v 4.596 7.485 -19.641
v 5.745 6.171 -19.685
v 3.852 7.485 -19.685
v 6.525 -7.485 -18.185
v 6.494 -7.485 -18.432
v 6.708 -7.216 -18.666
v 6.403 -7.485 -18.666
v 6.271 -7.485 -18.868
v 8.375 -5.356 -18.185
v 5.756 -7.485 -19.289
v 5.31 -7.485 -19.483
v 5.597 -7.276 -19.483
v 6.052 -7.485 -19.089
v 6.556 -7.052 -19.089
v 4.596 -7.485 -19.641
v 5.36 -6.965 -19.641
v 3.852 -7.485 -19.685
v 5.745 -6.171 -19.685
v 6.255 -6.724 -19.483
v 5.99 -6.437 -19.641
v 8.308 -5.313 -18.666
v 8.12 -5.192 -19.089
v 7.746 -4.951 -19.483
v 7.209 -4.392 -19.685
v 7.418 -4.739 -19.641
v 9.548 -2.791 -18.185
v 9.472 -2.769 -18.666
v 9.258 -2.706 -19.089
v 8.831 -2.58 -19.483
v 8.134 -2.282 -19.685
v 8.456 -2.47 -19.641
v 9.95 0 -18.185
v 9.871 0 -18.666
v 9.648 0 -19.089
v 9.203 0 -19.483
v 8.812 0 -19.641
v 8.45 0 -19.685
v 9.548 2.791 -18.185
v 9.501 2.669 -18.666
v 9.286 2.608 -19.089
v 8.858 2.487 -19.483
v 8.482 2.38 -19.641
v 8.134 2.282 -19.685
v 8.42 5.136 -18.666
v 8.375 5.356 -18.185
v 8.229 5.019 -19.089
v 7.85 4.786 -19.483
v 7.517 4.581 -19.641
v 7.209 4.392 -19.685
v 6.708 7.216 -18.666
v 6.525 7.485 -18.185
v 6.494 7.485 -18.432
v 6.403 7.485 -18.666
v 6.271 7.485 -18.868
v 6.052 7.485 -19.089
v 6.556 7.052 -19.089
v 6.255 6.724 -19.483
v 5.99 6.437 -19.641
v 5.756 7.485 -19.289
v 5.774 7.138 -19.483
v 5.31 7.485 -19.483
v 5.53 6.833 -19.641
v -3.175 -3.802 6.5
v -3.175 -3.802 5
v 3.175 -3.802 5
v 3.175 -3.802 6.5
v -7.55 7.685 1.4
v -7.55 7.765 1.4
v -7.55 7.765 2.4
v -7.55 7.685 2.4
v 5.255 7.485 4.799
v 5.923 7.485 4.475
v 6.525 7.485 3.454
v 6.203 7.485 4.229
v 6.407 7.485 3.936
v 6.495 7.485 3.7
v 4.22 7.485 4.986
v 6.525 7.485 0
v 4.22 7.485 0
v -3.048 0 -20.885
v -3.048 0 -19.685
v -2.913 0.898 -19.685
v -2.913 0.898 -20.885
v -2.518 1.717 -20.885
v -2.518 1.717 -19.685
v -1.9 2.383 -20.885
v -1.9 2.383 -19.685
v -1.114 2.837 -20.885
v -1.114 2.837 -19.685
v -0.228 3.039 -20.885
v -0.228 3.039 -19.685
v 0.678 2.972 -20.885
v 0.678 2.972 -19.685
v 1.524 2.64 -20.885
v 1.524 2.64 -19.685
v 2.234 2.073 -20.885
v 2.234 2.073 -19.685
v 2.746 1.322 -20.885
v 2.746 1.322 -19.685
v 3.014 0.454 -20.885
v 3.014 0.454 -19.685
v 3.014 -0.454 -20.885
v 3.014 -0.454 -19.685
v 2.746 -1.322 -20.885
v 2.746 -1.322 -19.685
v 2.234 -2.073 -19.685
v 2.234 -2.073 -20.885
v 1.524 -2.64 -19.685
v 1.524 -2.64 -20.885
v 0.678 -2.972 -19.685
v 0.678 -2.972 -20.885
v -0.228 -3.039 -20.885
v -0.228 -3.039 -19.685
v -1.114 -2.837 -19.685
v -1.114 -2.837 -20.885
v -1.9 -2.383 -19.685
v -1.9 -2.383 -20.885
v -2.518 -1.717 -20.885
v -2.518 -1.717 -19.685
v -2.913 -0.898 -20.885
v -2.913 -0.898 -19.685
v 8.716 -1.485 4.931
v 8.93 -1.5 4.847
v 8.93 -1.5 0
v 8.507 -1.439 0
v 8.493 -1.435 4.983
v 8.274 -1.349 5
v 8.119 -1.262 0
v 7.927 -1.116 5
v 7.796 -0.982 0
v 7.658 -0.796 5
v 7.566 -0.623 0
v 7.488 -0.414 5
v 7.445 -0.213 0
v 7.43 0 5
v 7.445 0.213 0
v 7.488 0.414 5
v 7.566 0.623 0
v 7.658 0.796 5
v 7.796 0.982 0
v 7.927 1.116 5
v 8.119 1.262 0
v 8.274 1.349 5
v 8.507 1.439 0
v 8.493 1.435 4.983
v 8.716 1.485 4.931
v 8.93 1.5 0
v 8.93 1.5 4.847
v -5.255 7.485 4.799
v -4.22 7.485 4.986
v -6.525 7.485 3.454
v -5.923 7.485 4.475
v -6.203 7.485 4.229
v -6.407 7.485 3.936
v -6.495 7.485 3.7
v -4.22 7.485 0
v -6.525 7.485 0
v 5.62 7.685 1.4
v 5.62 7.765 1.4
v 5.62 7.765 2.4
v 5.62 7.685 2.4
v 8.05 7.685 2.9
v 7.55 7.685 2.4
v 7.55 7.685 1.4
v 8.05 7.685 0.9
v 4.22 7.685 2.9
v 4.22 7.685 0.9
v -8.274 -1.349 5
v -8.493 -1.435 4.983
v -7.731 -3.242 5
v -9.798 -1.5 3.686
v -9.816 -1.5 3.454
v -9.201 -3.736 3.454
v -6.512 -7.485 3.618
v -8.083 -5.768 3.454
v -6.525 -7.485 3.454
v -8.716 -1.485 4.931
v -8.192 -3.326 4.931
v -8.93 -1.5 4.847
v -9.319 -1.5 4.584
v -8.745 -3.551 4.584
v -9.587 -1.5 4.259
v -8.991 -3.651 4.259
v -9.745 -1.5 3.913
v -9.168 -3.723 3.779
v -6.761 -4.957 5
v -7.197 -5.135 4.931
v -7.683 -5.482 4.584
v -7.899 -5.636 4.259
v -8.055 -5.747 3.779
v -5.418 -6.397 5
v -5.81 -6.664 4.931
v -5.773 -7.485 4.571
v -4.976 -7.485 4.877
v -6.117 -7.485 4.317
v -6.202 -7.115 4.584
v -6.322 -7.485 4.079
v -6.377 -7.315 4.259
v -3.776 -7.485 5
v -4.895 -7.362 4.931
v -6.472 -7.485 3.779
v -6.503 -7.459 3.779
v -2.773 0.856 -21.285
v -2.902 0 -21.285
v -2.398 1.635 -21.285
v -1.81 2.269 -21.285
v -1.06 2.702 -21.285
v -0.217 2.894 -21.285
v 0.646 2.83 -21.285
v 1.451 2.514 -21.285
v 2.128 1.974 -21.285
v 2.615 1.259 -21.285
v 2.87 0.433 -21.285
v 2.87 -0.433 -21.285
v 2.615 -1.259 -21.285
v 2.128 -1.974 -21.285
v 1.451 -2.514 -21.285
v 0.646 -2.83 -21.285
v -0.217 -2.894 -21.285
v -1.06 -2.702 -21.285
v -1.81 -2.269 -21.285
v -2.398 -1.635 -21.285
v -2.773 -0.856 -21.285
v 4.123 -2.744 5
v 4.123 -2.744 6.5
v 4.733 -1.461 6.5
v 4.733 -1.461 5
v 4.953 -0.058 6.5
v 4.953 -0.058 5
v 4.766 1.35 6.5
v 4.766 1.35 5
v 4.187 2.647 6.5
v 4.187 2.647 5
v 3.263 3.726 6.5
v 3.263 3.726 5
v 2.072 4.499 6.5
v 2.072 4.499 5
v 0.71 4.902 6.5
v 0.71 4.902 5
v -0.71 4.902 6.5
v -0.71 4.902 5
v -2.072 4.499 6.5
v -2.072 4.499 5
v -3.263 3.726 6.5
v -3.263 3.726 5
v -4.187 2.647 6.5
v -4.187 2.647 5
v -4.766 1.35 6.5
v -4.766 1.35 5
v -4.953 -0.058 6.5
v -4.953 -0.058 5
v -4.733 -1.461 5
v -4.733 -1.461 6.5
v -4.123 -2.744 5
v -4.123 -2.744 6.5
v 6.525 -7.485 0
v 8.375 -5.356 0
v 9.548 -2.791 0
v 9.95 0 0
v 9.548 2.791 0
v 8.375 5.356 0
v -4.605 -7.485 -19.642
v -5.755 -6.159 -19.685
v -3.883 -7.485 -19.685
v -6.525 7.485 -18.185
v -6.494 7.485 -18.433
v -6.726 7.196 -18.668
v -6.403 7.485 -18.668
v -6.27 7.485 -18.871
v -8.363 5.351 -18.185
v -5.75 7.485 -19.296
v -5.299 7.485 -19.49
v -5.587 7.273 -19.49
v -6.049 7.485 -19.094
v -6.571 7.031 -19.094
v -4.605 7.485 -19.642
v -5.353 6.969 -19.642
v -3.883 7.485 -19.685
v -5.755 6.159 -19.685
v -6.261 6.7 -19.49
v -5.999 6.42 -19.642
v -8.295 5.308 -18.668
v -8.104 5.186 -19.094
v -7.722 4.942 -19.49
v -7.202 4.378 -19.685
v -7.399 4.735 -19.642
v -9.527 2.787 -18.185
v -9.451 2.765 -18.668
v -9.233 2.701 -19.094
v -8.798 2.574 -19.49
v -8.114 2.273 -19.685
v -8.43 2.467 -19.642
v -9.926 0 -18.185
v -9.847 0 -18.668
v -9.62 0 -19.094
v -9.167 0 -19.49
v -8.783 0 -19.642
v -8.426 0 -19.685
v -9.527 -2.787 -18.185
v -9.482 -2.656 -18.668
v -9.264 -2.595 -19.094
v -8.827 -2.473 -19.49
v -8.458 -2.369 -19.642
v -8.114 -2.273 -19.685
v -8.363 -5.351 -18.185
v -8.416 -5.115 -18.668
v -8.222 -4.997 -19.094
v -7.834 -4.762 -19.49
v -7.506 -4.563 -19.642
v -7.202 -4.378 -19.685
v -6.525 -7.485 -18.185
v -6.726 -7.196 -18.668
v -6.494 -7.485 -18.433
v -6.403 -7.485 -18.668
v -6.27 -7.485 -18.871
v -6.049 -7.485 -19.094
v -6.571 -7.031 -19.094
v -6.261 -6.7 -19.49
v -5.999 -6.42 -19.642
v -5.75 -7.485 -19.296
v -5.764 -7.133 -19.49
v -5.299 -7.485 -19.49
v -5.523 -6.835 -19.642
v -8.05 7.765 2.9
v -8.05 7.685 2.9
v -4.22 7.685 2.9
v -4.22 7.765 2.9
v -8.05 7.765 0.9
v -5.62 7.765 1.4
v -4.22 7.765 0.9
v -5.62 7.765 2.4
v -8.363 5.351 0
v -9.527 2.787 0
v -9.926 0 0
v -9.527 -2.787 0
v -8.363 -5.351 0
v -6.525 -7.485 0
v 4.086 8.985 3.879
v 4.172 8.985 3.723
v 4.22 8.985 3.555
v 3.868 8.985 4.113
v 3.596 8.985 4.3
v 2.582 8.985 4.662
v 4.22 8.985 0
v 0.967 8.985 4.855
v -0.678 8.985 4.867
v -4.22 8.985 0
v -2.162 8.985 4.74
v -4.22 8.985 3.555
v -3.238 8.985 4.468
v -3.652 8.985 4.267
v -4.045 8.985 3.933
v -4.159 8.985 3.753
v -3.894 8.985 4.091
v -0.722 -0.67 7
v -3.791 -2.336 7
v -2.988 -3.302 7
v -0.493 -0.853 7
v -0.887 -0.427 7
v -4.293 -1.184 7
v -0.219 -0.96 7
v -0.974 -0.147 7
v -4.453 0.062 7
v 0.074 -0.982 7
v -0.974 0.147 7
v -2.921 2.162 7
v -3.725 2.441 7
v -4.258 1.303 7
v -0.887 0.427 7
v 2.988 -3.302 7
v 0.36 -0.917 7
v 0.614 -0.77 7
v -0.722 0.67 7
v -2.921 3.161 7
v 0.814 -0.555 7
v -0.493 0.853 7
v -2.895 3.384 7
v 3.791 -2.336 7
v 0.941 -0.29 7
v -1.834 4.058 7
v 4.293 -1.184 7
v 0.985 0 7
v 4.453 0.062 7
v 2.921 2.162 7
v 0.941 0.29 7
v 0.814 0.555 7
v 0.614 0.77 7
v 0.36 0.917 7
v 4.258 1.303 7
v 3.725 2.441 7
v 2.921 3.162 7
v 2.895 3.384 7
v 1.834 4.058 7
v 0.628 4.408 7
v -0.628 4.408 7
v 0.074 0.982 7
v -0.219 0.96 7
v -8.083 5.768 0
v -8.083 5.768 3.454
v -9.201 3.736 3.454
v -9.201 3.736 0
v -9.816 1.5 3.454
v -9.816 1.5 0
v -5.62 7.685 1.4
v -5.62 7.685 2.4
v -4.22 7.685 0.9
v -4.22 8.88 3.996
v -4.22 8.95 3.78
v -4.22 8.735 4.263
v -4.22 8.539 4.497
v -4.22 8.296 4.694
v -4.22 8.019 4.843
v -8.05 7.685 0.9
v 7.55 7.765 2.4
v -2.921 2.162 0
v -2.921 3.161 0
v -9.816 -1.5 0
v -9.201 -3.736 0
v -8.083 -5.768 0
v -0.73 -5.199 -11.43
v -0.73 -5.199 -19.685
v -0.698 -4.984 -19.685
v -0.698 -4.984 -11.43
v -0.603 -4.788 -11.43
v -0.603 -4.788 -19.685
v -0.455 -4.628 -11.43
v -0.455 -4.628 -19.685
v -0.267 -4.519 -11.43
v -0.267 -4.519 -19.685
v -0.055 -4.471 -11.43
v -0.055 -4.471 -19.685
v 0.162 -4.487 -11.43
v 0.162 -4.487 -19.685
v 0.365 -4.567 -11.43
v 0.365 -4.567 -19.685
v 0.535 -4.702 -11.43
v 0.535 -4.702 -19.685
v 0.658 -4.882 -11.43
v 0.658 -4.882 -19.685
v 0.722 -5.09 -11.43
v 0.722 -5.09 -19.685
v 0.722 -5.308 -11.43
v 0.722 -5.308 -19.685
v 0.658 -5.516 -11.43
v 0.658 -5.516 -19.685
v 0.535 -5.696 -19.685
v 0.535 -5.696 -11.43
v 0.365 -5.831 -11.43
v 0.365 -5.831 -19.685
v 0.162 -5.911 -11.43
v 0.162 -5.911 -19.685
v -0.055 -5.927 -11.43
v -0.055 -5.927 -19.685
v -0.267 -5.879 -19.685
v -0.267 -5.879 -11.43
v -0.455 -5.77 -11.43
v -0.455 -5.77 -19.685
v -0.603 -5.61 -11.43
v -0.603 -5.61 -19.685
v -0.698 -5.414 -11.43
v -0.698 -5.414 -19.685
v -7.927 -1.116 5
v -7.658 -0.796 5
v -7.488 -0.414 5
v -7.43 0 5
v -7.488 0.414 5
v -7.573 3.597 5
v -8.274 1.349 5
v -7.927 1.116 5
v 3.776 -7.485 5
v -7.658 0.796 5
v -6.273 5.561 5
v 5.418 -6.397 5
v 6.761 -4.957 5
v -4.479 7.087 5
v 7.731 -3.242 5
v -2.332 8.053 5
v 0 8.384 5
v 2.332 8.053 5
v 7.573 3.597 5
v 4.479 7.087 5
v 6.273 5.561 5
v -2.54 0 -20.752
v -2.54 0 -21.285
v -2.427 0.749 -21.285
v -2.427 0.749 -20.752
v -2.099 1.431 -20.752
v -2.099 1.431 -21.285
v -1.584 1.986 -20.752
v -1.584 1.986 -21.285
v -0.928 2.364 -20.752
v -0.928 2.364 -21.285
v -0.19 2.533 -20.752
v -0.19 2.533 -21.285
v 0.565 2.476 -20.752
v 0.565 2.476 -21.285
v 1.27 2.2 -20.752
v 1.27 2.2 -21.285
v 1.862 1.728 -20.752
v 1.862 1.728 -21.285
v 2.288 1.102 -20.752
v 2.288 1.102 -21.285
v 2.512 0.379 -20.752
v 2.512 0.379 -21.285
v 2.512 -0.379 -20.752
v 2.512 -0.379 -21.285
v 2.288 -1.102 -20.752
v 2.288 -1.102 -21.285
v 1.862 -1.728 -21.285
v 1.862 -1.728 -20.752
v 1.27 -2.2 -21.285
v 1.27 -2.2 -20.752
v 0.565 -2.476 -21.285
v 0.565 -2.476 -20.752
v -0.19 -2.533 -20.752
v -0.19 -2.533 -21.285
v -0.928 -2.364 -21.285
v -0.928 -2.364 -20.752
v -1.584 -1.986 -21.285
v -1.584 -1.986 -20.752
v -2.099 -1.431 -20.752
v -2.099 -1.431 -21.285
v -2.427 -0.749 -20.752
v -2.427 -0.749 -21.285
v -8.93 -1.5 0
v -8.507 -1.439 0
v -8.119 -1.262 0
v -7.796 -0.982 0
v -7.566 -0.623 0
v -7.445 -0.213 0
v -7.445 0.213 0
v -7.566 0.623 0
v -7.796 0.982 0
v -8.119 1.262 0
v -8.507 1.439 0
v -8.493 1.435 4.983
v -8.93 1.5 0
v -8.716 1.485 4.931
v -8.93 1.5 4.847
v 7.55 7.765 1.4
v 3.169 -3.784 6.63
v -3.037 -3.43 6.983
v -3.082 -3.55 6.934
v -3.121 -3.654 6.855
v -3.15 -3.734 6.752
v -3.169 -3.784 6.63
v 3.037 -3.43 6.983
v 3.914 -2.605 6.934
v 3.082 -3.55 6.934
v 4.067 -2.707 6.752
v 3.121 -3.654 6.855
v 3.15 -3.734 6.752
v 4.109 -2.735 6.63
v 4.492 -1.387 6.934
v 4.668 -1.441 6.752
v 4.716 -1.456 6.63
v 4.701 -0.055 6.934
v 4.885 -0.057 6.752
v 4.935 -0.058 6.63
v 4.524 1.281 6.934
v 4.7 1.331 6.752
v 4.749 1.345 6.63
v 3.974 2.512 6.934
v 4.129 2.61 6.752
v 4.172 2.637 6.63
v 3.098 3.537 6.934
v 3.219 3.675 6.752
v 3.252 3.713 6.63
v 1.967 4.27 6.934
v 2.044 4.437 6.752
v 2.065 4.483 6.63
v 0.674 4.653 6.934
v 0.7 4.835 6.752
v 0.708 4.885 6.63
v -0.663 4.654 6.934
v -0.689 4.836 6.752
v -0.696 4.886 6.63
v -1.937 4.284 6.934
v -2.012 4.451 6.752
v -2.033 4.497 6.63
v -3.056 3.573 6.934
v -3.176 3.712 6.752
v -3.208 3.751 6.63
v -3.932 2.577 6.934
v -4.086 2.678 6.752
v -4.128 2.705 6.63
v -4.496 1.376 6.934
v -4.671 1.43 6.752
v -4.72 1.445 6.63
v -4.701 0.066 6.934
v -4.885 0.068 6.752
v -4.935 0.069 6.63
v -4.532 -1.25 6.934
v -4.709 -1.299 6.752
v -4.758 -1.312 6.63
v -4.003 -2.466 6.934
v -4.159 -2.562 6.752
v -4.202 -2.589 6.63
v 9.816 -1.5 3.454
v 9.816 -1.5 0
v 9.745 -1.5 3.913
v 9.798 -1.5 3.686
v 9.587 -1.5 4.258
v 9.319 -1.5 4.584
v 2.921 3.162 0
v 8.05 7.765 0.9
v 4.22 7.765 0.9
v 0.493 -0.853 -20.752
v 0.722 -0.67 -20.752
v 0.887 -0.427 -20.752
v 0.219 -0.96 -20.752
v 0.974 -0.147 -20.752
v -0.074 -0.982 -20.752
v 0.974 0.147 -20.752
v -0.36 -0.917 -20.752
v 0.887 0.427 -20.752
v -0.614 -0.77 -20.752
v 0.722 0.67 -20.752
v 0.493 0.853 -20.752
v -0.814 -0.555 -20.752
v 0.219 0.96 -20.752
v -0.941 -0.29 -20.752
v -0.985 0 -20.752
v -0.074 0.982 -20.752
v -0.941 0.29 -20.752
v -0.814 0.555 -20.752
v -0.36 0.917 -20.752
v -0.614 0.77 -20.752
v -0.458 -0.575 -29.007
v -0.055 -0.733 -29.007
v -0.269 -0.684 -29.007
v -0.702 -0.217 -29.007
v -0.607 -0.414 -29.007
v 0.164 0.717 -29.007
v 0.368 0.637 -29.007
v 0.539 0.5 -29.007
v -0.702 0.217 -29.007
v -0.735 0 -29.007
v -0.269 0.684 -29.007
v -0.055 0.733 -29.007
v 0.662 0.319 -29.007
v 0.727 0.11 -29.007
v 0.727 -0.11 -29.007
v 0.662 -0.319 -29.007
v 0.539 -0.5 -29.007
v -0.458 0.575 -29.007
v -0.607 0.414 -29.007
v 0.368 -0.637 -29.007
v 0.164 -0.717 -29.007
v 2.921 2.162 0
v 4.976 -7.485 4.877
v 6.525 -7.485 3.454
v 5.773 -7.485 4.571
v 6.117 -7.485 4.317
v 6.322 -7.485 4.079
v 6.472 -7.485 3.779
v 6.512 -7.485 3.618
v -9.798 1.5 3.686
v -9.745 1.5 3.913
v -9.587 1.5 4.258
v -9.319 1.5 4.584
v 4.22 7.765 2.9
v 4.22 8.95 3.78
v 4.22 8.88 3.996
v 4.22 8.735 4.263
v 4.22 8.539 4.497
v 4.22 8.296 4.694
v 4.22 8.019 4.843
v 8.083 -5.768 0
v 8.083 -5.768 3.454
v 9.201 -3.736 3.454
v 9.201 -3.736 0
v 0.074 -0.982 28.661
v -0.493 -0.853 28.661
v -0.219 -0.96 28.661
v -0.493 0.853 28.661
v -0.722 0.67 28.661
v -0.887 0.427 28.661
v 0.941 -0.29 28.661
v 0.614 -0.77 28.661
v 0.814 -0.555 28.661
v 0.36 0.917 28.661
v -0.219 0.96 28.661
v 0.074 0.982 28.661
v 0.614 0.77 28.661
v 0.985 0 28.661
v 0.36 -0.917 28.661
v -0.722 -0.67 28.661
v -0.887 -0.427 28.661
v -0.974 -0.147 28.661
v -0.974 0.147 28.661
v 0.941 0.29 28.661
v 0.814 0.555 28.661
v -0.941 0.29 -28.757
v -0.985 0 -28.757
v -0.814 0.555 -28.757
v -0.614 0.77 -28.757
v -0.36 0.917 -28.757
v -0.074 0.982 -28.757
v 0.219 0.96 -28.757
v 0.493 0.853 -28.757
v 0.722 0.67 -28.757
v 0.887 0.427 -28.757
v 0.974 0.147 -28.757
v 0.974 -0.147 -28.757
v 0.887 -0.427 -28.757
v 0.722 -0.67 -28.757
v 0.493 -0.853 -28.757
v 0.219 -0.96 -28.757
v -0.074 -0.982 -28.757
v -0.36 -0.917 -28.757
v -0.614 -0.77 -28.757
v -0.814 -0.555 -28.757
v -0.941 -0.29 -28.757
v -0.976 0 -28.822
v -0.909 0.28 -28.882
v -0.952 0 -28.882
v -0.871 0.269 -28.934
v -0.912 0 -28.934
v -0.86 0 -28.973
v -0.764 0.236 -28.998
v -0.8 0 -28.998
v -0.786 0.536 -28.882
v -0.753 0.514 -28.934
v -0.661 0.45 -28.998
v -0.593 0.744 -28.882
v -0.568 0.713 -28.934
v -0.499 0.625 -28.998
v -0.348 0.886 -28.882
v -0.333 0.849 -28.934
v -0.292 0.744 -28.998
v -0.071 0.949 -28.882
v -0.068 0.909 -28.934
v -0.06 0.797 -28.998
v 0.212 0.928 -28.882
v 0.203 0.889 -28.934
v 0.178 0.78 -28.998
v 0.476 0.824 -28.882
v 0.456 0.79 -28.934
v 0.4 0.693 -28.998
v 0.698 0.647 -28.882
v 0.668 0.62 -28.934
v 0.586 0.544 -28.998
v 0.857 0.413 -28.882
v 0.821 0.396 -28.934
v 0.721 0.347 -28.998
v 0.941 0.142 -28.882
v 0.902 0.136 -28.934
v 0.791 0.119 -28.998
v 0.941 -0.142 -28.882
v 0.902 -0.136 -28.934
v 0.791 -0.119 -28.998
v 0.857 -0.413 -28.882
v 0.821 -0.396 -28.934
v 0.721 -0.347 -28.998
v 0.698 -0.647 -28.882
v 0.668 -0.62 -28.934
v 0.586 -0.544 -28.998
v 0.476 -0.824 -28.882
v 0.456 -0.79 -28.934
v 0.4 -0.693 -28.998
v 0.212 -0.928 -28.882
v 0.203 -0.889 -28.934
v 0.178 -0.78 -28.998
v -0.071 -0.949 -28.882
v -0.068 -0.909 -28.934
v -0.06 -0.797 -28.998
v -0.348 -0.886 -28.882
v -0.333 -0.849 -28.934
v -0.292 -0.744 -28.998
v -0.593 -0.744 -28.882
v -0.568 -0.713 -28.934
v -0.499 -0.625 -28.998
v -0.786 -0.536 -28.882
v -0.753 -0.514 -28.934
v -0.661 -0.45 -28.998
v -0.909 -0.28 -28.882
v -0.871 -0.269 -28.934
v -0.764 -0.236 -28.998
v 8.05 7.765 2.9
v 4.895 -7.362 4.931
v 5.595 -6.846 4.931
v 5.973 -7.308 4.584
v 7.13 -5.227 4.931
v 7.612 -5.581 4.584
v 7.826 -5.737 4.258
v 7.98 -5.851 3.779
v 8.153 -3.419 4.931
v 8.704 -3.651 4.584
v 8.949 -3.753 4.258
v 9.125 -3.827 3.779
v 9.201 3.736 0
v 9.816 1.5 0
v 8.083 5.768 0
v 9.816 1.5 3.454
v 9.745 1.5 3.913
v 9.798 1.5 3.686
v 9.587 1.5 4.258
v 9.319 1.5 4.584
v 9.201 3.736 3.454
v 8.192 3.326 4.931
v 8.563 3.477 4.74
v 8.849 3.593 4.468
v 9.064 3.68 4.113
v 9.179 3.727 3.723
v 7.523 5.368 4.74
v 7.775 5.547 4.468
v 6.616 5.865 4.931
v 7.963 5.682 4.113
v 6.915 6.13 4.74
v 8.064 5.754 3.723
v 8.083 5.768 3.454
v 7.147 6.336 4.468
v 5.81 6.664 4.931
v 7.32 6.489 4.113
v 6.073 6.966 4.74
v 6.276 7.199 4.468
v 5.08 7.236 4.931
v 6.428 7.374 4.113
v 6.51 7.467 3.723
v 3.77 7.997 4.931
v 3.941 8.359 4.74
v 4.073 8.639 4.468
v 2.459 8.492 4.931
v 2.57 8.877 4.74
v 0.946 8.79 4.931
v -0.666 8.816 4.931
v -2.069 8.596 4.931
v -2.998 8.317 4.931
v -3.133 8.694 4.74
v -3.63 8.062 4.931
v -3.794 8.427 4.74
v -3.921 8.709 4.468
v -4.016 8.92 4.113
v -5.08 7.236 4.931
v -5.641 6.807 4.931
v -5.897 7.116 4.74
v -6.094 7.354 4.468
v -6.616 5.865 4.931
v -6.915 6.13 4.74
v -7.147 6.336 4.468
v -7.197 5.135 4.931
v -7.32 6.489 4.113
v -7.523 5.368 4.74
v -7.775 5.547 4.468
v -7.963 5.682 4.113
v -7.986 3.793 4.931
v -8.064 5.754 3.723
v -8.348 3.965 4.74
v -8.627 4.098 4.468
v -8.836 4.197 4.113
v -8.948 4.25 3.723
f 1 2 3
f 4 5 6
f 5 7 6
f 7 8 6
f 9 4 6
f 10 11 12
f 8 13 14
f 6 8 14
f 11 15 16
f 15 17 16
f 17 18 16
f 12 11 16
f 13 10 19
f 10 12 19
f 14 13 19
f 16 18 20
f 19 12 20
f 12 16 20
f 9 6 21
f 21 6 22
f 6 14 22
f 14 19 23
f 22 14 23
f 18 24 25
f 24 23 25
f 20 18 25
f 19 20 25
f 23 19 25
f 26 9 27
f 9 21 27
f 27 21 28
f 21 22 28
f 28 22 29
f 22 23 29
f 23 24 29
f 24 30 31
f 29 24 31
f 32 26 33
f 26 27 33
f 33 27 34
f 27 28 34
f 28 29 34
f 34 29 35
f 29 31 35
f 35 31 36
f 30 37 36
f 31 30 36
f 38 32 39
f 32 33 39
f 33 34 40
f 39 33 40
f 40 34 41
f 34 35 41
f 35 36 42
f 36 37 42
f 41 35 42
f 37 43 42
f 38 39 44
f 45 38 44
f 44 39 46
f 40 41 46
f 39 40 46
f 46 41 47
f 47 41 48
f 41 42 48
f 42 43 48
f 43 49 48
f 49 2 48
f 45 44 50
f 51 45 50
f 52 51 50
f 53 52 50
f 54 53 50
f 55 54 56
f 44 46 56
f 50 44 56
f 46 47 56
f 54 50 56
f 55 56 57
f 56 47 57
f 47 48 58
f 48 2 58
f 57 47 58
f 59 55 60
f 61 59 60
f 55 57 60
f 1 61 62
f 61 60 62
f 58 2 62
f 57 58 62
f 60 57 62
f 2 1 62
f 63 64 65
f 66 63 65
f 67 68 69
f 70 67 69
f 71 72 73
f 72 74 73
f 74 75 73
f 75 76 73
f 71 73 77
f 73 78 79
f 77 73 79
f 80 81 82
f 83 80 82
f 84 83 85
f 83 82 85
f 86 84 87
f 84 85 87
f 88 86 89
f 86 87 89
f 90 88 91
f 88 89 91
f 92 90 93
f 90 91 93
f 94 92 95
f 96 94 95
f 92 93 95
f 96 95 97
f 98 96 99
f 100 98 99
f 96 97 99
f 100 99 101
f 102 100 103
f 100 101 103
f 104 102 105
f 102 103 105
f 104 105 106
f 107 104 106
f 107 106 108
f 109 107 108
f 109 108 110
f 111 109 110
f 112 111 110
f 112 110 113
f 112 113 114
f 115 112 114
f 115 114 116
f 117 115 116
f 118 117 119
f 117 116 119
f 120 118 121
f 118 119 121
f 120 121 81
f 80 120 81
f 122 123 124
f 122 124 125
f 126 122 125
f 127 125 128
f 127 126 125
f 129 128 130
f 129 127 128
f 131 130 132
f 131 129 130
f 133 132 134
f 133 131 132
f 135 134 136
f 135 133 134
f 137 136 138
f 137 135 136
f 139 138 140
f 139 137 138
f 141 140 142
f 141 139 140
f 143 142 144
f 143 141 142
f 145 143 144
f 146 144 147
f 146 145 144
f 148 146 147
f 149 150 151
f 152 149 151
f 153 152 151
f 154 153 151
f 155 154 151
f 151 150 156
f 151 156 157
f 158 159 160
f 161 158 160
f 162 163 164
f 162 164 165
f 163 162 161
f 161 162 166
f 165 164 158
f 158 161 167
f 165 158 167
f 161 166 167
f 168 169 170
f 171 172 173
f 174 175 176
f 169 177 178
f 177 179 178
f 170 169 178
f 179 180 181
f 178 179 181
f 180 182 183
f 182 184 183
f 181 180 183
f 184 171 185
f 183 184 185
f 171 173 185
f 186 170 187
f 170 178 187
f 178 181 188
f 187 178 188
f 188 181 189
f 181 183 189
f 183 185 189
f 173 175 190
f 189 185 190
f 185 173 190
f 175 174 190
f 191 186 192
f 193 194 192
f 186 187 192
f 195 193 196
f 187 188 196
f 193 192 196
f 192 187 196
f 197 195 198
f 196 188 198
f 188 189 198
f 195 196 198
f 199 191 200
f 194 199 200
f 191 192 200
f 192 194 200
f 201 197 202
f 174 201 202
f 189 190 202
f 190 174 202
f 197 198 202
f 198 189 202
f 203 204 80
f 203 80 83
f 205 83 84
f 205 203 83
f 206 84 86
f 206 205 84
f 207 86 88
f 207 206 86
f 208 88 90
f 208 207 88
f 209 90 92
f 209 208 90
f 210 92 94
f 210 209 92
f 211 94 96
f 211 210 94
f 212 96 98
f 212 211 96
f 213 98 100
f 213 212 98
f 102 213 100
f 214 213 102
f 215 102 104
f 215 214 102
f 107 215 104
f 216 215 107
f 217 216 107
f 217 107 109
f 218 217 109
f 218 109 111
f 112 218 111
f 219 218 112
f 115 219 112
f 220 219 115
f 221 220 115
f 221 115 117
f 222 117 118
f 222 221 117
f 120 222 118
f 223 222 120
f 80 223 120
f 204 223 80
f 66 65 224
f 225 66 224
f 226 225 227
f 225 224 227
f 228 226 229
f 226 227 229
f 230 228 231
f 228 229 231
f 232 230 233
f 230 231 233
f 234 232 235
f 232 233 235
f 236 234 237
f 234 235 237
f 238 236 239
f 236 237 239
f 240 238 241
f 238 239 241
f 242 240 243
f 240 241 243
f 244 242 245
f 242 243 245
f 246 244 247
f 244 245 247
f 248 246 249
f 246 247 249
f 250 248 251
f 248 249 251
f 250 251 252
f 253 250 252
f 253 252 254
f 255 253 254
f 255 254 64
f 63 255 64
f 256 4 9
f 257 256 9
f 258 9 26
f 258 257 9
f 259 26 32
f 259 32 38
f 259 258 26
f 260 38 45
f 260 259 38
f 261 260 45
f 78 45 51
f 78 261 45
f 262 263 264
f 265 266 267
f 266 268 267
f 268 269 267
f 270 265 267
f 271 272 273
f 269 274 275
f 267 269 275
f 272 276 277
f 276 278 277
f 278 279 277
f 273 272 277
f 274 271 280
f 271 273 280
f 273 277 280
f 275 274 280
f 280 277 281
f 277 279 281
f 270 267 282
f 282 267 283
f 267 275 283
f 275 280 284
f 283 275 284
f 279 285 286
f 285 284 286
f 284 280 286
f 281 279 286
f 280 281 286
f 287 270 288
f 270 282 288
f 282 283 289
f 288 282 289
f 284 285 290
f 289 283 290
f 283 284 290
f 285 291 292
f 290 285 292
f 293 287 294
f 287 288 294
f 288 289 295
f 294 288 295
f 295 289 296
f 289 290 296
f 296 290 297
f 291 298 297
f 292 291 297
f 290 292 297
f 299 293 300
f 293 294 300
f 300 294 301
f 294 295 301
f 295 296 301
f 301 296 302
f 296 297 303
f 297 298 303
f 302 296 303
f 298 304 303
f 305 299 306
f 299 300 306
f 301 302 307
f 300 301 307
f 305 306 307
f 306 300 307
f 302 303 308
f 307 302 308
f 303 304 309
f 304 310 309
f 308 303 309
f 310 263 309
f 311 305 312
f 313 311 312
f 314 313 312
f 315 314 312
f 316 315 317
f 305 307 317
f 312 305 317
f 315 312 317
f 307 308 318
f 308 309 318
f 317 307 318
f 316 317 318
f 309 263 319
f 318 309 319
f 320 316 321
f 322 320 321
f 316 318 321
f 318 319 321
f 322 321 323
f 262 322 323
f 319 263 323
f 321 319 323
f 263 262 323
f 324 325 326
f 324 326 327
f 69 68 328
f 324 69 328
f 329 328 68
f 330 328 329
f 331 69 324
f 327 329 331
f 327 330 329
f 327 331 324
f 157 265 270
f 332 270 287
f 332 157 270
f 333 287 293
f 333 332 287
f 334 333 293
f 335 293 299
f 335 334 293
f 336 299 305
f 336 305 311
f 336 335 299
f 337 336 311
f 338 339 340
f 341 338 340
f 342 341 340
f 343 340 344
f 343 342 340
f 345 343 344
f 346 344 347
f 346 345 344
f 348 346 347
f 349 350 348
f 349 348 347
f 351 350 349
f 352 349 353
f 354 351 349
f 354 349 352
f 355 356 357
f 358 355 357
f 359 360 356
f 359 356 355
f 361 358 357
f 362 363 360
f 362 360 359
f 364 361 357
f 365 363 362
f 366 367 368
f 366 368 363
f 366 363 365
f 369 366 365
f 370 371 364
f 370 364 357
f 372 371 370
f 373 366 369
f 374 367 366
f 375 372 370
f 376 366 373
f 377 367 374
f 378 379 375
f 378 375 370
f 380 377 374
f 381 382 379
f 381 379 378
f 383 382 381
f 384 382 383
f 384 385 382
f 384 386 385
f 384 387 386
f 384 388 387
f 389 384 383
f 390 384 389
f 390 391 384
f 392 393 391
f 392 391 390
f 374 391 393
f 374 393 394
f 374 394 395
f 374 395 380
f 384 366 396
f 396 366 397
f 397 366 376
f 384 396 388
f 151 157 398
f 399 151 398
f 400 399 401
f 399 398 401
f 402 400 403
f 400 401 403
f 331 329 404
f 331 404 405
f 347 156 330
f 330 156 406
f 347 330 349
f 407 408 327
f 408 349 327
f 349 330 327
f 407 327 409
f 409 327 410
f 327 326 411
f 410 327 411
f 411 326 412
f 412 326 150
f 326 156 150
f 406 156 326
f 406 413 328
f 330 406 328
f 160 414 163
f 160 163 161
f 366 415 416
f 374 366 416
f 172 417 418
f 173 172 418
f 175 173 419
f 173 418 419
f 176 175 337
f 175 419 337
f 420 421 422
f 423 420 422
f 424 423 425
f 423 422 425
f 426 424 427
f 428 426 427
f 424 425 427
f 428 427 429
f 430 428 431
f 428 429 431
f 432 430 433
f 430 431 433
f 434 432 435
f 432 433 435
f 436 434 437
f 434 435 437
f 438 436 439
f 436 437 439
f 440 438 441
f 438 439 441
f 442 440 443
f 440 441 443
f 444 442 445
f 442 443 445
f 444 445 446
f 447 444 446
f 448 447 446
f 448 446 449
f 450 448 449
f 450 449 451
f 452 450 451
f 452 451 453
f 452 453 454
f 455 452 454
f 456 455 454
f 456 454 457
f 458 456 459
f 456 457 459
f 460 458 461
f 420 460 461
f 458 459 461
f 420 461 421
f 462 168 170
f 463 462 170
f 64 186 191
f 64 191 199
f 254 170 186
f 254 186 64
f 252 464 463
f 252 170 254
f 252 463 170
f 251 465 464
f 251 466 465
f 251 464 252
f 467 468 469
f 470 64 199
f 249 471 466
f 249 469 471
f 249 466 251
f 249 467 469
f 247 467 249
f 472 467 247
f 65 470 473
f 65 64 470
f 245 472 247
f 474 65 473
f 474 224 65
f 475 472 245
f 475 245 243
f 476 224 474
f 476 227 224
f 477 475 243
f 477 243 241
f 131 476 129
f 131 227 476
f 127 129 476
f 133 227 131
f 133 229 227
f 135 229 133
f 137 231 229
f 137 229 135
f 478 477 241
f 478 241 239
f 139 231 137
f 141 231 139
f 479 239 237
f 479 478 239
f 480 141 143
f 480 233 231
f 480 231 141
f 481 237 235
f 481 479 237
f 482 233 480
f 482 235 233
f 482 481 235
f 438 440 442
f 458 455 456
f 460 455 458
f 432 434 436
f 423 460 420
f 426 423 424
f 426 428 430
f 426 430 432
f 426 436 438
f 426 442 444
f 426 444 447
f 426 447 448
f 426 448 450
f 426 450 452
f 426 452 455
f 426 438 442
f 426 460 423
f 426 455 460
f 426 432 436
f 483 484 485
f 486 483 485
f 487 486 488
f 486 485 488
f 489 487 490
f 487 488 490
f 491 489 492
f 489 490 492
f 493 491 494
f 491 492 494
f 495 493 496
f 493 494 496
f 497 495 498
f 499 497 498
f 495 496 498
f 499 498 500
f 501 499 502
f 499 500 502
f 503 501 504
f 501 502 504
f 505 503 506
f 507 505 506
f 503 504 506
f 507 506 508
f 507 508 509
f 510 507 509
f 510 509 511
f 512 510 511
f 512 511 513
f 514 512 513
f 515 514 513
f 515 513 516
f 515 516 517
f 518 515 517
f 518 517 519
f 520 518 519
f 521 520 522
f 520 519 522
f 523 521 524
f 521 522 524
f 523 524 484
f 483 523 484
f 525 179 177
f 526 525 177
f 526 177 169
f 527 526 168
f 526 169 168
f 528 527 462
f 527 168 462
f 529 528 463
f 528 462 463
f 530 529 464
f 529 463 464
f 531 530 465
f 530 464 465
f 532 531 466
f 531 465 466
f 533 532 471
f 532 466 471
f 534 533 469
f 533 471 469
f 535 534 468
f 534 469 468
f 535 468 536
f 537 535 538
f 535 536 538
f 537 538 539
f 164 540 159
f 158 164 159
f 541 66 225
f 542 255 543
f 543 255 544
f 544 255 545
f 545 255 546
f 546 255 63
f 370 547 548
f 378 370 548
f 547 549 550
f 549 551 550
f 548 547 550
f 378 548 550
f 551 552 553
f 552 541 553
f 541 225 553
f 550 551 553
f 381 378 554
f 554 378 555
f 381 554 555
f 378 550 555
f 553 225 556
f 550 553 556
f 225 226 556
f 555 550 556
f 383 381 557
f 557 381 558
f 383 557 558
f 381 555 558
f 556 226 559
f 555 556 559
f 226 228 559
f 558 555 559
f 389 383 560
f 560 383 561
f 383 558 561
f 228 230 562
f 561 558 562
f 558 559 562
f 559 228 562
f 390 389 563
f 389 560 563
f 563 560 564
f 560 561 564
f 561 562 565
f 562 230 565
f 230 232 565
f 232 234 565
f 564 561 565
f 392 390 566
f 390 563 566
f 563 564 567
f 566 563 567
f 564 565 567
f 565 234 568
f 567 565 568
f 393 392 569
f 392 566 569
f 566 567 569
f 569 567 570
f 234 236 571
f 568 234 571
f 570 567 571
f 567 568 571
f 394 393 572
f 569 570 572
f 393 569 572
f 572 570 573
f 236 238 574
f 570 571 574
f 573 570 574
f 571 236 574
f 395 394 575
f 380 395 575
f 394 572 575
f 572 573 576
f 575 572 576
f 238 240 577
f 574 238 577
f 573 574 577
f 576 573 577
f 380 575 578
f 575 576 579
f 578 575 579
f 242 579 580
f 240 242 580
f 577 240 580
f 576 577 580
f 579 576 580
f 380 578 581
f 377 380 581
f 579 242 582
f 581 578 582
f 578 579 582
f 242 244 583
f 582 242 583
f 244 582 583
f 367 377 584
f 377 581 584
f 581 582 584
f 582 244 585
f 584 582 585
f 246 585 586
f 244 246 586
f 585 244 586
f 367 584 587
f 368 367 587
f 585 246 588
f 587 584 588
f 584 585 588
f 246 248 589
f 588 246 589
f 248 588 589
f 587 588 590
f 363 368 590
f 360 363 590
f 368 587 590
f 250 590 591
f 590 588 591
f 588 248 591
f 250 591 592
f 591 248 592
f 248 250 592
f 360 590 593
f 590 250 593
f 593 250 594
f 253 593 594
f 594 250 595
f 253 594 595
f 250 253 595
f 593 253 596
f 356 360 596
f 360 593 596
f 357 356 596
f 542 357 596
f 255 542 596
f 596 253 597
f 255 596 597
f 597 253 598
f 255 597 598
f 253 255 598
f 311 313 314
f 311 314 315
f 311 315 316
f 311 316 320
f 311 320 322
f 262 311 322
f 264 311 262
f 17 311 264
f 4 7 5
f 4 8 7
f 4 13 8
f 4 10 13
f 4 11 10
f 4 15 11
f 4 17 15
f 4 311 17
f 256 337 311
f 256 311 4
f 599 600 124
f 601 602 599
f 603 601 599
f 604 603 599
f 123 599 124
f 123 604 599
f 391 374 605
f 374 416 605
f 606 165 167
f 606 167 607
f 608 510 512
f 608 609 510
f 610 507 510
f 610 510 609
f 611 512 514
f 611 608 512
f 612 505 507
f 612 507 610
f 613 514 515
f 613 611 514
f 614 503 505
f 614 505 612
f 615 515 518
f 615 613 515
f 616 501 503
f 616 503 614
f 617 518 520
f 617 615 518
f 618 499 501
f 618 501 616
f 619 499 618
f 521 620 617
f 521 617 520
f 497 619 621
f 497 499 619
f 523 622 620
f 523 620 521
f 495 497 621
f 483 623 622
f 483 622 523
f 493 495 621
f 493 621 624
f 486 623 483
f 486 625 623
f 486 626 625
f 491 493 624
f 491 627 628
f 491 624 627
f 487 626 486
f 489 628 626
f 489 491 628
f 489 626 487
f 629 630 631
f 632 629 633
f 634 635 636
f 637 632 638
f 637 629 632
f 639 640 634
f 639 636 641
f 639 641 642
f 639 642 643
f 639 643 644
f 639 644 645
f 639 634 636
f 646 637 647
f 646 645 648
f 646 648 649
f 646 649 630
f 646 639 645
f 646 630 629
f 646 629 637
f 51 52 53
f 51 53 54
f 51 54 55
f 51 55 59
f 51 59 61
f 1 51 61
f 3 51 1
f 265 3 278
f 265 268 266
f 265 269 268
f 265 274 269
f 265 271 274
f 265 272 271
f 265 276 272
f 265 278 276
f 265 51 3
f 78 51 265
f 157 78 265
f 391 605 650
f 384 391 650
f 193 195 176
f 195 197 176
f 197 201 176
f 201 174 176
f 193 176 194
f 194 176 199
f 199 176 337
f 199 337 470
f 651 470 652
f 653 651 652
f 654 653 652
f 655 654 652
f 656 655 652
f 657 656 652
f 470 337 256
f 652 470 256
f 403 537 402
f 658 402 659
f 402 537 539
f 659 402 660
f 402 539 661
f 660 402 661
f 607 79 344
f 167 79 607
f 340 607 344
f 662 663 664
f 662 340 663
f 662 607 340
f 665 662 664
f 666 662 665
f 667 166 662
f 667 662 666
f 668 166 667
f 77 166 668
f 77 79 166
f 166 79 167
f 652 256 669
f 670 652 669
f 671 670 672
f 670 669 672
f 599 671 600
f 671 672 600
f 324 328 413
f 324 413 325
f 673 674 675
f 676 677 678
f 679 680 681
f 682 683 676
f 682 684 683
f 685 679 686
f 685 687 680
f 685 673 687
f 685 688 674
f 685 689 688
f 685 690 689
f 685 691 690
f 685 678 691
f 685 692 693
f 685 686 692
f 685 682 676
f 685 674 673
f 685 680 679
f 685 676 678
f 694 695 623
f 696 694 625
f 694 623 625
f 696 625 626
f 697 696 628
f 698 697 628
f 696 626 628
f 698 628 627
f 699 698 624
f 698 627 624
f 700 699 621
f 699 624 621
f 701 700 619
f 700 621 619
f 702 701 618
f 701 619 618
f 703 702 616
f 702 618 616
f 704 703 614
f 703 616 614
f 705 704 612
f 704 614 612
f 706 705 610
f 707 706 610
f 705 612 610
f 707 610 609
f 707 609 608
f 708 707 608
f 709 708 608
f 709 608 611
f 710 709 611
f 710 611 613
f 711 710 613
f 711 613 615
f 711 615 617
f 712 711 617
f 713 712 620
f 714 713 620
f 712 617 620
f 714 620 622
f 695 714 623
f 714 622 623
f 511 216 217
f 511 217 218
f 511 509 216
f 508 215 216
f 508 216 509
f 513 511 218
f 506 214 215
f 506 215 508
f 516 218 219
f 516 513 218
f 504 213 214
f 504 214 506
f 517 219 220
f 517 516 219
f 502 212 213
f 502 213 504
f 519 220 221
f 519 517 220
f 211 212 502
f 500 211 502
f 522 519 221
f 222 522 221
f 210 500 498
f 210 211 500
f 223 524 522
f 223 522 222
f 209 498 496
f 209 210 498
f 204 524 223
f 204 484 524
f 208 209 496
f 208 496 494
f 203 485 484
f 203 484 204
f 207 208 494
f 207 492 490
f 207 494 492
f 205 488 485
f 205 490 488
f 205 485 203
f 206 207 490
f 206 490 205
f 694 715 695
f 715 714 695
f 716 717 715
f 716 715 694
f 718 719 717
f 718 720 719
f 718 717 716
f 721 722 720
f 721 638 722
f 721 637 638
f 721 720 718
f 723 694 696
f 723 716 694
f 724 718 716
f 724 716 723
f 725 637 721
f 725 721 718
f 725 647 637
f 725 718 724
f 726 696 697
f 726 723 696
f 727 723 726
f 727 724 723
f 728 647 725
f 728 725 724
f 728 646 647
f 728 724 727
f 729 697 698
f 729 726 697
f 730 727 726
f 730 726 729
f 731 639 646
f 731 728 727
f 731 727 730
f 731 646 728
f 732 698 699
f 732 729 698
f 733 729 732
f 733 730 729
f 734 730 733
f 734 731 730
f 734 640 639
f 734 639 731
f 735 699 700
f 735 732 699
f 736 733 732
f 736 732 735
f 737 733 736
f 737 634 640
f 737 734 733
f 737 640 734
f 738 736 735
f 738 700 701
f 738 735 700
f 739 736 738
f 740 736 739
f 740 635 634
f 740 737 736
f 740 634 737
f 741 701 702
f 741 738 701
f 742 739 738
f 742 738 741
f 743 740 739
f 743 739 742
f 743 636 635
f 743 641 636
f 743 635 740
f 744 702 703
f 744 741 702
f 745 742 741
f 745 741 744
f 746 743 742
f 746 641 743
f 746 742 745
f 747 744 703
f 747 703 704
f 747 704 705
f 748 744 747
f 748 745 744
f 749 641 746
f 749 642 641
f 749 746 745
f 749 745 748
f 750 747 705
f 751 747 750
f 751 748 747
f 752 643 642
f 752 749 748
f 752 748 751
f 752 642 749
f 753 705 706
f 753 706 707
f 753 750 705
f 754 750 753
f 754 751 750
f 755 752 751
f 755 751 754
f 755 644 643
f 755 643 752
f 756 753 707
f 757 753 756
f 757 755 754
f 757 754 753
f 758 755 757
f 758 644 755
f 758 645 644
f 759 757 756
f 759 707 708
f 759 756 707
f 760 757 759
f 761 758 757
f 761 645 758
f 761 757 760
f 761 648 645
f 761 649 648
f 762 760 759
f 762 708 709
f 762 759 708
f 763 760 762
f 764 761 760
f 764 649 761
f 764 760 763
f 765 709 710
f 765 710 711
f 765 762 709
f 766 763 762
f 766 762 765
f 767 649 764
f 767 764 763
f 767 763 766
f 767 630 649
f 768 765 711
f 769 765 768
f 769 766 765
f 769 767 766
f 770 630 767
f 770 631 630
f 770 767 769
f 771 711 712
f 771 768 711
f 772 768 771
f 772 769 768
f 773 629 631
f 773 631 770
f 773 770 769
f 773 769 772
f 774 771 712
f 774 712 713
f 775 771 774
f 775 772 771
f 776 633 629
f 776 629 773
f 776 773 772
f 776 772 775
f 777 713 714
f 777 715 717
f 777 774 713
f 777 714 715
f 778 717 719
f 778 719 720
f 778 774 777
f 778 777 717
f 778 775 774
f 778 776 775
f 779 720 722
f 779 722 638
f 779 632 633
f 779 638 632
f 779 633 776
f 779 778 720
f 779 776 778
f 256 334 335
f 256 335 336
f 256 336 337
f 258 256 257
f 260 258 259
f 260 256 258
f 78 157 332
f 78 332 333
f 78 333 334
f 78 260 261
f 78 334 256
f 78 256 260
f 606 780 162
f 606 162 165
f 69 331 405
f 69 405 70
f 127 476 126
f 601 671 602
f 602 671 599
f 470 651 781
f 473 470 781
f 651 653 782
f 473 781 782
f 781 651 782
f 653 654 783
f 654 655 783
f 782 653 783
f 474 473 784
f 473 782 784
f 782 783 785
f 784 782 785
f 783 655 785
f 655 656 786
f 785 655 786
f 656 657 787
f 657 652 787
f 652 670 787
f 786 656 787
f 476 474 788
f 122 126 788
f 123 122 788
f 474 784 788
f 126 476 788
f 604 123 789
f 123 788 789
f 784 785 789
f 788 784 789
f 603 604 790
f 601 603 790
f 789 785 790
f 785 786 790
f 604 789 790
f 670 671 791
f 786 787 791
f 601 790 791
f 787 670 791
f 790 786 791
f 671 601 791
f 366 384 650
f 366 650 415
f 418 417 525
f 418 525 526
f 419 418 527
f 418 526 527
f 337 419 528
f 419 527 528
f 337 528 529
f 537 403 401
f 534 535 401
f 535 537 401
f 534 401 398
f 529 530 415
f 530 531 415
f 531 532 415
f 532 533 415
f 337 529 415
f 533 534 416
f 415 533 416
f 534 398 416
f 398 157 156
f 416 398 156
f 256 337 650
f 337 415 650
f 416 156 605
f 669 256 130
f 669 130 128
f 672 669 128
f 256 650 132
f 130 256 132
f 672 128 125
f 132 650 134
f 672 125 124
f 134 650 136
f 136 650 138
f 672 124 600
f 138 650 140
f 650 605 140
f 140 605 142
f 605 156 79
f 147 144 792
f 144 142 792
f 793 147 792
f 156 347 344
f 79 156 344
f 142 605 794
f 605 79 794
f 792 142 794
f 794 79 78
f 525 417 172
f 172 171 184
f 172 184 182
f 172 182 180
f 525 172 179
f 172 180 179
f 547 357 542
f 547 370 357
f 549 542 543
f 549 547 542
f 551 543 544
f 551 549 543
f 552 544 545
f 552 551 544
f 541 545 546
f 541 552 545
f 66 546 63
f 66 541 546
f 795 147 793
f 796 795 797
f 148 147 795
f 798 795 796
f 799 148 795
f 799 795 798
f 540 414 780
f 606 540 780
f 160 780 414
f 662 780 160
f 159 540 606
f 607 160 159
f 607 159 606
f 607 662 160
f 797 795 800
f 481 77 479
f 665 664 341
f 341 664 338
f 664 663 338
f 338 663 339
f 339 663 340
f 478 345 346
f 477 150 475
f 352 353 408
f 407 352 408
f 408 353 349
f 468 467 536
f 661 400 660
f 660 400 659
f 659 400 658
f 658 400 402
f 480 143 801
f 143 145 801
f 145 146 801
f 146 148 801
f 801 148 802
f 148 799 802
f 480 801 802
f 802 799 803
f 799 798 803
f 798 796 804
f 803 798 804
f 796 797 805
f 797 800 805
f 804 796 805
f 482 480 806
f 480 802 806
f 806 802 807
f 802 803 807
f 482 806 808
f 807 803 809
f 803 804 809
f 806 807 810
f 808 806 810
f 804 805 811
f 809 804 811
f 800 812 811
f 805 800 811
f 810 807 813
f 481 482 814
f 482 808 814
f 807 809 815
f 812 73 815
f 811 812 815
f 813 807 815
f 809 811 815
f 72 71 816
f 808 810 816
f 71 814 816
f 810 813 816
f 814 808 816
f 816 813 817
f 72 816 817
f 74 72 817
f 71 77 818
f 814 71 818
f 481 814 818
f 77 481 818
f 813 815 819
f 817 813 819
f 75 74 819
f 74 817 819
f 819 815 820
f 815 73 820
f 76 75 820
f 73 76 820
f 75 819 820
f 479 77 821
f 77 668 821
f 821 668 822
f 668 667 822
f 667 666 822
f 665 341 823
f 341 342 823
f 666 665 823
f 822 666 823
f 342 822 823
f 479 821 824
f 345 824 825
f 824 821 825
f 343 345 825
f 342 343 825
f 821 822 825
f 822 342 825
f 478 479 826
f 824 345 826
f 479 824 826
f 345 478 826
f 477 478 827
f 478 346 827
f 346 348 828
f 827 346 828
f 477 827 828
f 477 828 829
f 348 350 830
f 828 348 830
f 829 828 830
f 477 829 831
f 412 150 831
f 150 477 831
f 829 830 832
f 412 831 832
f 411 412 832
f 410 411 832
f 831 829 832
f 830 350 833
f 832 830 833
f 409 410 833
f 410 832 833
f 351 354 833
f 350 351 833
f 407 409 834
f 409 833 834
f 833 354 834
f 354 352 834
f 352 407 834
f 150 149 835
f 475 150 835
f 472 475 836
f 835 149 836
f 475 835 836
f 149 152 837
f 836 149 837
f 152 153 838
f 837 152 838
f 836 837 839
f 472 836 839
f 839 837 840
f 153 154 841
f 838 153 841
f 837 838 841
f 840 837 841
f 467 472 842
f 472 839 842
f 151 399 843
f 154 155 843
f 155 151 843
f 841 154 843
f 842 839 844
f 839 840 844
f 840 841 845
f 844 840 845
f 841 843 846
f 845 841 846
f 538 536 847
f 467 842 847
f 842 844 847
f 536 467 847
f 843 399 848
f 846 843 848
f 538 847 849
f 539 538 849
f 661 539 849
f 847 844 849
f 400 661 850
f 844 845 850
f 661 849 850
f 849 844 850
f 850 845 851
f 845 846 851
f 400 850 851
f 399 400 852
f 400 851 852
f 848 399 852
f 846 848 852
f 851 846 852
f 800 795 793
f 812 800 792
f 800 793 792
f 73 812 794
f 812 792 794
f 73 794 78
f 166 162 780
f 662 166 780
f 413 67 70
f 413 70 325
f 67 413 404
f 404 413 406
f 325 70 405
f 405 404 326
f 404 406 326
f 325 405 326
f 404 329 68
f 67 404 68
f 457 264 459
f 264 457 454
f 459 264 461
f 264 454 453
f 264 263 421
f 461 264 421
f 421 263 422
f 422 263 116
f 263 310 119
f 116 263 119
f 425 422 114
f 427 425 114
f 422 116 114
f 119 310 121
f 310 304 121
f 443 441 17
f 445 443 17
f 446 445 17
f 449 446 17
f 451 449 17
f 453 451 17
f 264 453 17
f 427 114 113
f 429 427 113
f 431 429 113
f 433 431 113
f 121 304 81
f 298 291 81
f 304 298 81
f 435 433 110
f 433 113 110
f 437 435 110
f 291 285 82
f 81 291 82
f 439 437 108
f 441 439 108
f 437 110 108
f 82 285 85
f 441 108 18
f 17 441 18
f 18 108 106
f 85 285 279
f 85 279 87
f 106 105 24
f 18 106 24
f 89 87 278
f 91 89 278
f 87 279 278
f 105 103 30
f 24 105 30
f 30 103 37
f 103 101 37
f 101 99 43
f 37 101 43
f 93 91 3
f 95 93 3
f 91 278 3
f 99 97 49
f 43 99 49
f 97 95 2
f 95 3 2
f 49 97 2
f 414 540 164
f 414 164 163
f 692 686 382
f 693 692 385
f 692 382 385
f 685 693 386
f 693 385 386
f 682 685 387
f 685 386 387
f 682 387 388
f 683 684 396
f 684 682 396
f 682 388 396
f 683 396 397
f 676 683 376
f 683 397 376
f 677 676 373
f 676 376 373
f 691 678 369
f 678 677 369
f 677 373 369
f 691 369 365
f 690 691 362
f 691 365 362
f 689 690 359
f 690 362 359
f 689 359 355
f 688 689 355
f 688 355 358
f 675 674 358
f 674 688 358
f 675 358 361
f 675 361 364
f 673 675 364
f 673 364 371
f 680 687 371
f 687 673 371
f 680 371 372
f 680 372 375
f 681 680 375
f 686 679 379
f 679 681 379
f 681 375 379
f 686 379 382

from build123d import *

# Parameters (mm, degrees)
EXTRUDE1_DEPTH          = 5
EXTRUDE2_DEPTH          = 2
SKETCH5_R               = 0.985
EXTRUDE3_DEPTH          = 25
FILLET1_R               = 0.25
FILLET2_R               = 0.5
CUT_EXTRUDE2_DEPTH      = 6
SKETCH7_W               = 8.44
SKETCH7_H               = 5
EXTRUDE4_DEPTH          = 1.5
SKETCH9_W               = 2
SKETCH9_H               = 0.08
EXTRUDE5_DEPTH          = 3.83
CUT_EXTRUDE4_REACH      = 17.25
SKETCH10_W              = 1.93
SKETCH10_H              = 1
SKETCH21_W              = 2
SKETCH21_H              = 0.08
EXTRUDE6_DEPTH          = 3.83
SKETCH22_W              = 1.93
SKETCH22_H              = 1
CUT_EXTRUDE5_DEPTH      = 0.09
EXTRUDE7_DEPTH          = 19.685
FILLET6_R               = 1.5
SKETCH26_R              = 3.048
EXTRUDE9_DEPTH          = 1.6002
SKETCH27_R              = 2.54
CUT_EXTRUDE6_DEPTH      = 0.5334
CHAMFER1_SIZE           = 0.4
CHAMFER1_SIZE2          = 0.145588094
SKETCH29_R              = 0.985
EXTRUDE10_DEPTH         = 8.255
FILLET7_R               = 0.25
SKETCH30_R              = 0.73025
CUT_EXTRUDE7_DEPTH      = 8.255
CUT_EXTRUDE9_DEPTH      = 2
CUT_EXTRUDE9_DEPTH_BACK = 5
SKETCH31_R              = 2.701313407
CUT_EXTRUDE10_DEPTH     = 2.275338
SKETCH32_R              = 2.019963582
CUT_EXTRUDE11_DEPTH     = 1.063418


with BuildPart() as part:
    # Sketch1 → Extrude1 (new body)
    with BuildSketch(Plane.XY):
        with BuildLine():
            Line((-6.525310337, -7.485), (6.525310337, -7.485))
            ThreePointArc((6.525310337, -7.485), (9.93, 0), (6.525310337, 7.485))
            Line((6.525310337, 7.485), (-6.525310337, 7.485))
            ThreePointArc((-6.525310337, 7.485), (-9.93, 0), (-6.525310337, -7.485))
        make_face()
    extrude(amount=EXTRUDE1_DEPTH)

    # Sketch2 → Extrude2 (add)
    with BuildSketch(Plane.XY.offset(5)):
        with BuildLine():
            Line((-3.175, -3.801523905), (3.175, -3.801523905))
            ThreePointArc((3.175, -3.801523905), (0, 4.953), (-3.175, -3.801523905))
        make_face()
    extrude(amount=EXTRUDE2_DEPTH)

    # Sketch5 → Extrude3 (add)
    with BuildSketch(Plane.XY.offset(7)):
        Circle(SKETCH5_R)
    extrude(amount=EXTRUDE3_DEPTH)

    # Fillet1
    fillet1_edges = [part.edges().sort_by_distance(p)[0] for p in [
        (-0.985, 0, 32),
    ]]
    fillet(fillet1_edges, radius=FILLET1_R)

    # Fillet2
    fillet2_edges = [part.edges().sort_by_distance(p)[0] for p in [
        (0, 4.953, 7),
        (0, -3.801523905, 7),
    ]]
    fillet(fillet2_edges, radius=FILLET2_R)

    # Sketch6 → Cut-Extrude2 (cut, through all)
    with BuildSketch(Plane.XY.offset(5)):
        with BuildLine():
            Line((8.93, 1.5), (9.816053178, 1.5))
            ThreePointArc((9.816053178, 1.5), (9.93, 0), (9.816053178, -1.5))
            Line((9.816053178, -1.5), (8.93, -1.5))
            ThreePointArc((8.93, -1.5), (7.43, 0), (8.93, 1.5))
        make_face()
    cut_extrude2 = extrude(amount=-CUT_EXTRUDE2_DEPTH, mode=Mode.SUBTRACT)

    # Mirror1: Cut-Extrude2 across plane
    add(cut_extrude2.mirror(Plane(origin=(0, 0, 0), x_dir=(0, 0, 1), z_dir=(1, 0, 0))), mode=Mode.SUBTRACT)

    # Sketch7 → Extrude4 (add)
    with BuildSketch(Plane(origin=(0, 7.485, 0), x_dir=(-1, 0, 0), z_dir=(0, 1, 0))):
        with Locations((0, 2.5)):
            Rectangle(SKETCH7_W, SKETCH7_H)
    extrude(amount=EXTRUDE4_DEPTH)

    # Sketch8 → Cut-Revolve1 (revolve, cut)
    with BuildSketch(Plane(origin=(0, 0, 0), x_dir=(-0.988524993, -0.151057402, 0), z_dir=(-0.151057402, 0.988524993, 0))):
        with BuildLine():
            Line((9.93, 3.453506144), (12.335658501, 3.453506144))
            Line((12.335658501, 3.453506144), (12.335658501, 5.727879127))
            Line((12.335658501, 5.727879127), (8.383506144, 5.727879127))
            Line((8.383506144, 5.727879127), (8.383506144, 5))
            ThreePointArc((8.383506144, 5), (9.477042437, 4.547042437), (9.93, 3.453506144))
        make_face()
    revolve(axis=Axis((0, 0, 0), (0, 0, 1)), mode=Mode.SUBTRACT)

    # Sketch9 → Extrude5 (add)
    with BuildSketch(Plane(origin=(4.22, 0, 0), x_dir=(0, 0, -1), z_dir=(1, 0, 0))):
        with Locations((-1.9, 7.725)):
            Rectangle(SKETCH9_W, SKETCH9_H)
    extrude(amount=EXTRUDE5_DEPTH)

    # Sketch10 → Cut-Extrude4 (cut, up to next)
    with BuildSketch(Plane(origin=(0, 7.765, 0), x_dir=(-1, 0, 0), z_dir=(0, 1, 0)), mode=Mode.PRIVATE) as cut_extrude4_sk1:
        with Locations((-6.585, 1.9)):
            Rectangle(SKETCH10_W, SKETCH10_H)
    cut_extrude4_tool1 = extrude(cut_extrude4_sk1.sketch, amount=-CUT_EXTRUDE4_REACH, mode=Mode.PRIVATE) & part.part
    add(cut_extrude4_tool1.solids().sort_by_distance((6.585, 7.765, 1.9))[0], mode=Mode.SUBTRACT)

    # Sketch21 → Extrude6 (add)
    with BuildSketch(Plane.ZY.offset(4.22)):
        with Locations((1.9, 7.725)):
            Rectangle(SKETCH21_W, SKETCH21_H)
    extrude(amount=EXTRUDE6_DEPTH)

    # Sketch22 → Cut-Extrude5 (cut)
    with BuildSketch(Plane(origin=(0, 7.765, 0), x_dir=(-1, 0, 0), z_dir=(0, 1, 0))):
        with Locations((6.585, 1.9)):
            Rectangle(SKETCH22_W, SKETCH22_H)
    extrude(amount=-CUT_EXTRUDE5_DEPTH, mode=Mode.SUBTRACT)

    # Sketch4 → Cut-Extrude9 (cut, two sides)
    with BuildSketch(Plane.XY.offset(5)) as cut_extrude9_sk:
        Polygon((-2.921, 3.161292816), (2.92099995, 3.16205781), (2.921, 2.16205781), (-2.921, 2.16205781), align=None)
    extrude(amount=CUT_EXTRUDE9_DEPTH, mode=Mode.SUBTRACT)
    extrude(cut_extrude9_sk.sketch, amount=-CUT_EXTRUDE9_DEPTH_BACK, mode=Mode.SUBTRACT)

    # Sketch31 → Cut-Extrude10 (cut)
    with BuildSketch(Plane.XY.offset(32)):
        Circle(SKETCH31_R)
    extrude(amount=-CUT_EXTRUDE10_DEPTH, mode=Mode.SUBTRACT)

    # Sketch32 → Cut-Extrude11 (cut)
    with BuildSketch(Plane.XY.offset(29.724661786)):
        Circle(SKETCH32_R)
    extrude(amount=-CUT_EXTRUDE11_DEPTH, mode=Mode.SUBTRACT)


with BuildPart() as body_2:
    # Sketch23 → Extrude7 (new body)
    with BuildSketch(Plane(origin=(0, 0, 0), x_dir=(-1, 0, 0), z_dir=(0, 0, -1))):
        with BuildLine():
            Line((-6.525310337, 7.485), (6.525310337, 7.485))
            ThreePointArc((6.525310337, 7.485), (9.926356983, 0), (6.525310337, -7.485))
            Line((6.525310337, -7.485), (-6.525310337, -7.485))
            ThreePointArc((-6.525310337, -7.485), (-9.950448891, 0), (-6.525310337, 7.485))
        make_face()
    extrude(amount=EXTRUDE7_DEPTH)

    # Fillet6
    fillet6_edges = [body_2.edges().sort_by_distance(p)[0] for p in [
        (9.950448891, 0, -19.685),
        (-9.926356983, 0, -19.685),
    ]]
    fillet(fillet6_edges, radius=FILLET6_R)

    # Sketch26 → Extrude9 (add)
    with BuildSketch(Plane(origin=(0, 0, -19.685), x_dir=(-1, 0, 0), z_dir=(0, 0, -1))):
        Circle(SKETCH26_R)
    extrude(amount=EXTRUDE9_DEPTH)

    # Sketch27 → Cut-Extrude6 (cut)
    with BuildSketch(Plane(origin=(0, 0, -21.2852), x_dir=(-1, 0, 0), z_dir=(0, 0, -1))):
        Circle(SKETCH27_R)
    extrude(amount=-CUT_EXTRUDE6_DEPTH, mode=Mode.SUBTRACT)

    # Chamfer1
    chamfer1_edges = [body_2.edges().sort_by_distance(p)[0] for p in [
        (3.048, 0, -21.2852),
    ]]
    chamfer1_side = [body_2.faces().sort_by_distance(p)[0] for p in [
        (3.048, 0, -20.4851),
    ]]
    chamfer(chamfer1_edges, length=CHAMFER1_SIZE, length2=CHAMFER1_SIZE2, reference=chamfer1_side[0])

    # Sketch29 → Extrude10 (add)
    with BuildSketch(Plane(origin=(0, 0, -20.7518), x_dir=(-1, 0, 0), z_dir=(0, 0, -1))):
        Circle(SKETCH29_R)
    extrude(amount=EXTRUDE10_DEPTH)

    # Fillet7
    fillet7_edges = [body_2.edges().sort_by_distance(p)[0] for p in [
        (0.985, 0, -29.0068),
    ]]
    fillet(fillet7_edges, radius=FILLET7_R)

    # Sketch30 → Cut-Extrude7 (cut)
    with BuildSketch(Plane(origin=(0, 0, -19.685), x_dir=(-1, 0, 0), z_dir=(0, 0, -1))):
        with Locations((0, -5.199)):
            Circle(SKETCH30_R)
    extrude(amount=-CUT_EXTRUDE7_DEPTH, mode=Mode.SUBTRACT)


solid = Compound([part.part, body_2.part])
